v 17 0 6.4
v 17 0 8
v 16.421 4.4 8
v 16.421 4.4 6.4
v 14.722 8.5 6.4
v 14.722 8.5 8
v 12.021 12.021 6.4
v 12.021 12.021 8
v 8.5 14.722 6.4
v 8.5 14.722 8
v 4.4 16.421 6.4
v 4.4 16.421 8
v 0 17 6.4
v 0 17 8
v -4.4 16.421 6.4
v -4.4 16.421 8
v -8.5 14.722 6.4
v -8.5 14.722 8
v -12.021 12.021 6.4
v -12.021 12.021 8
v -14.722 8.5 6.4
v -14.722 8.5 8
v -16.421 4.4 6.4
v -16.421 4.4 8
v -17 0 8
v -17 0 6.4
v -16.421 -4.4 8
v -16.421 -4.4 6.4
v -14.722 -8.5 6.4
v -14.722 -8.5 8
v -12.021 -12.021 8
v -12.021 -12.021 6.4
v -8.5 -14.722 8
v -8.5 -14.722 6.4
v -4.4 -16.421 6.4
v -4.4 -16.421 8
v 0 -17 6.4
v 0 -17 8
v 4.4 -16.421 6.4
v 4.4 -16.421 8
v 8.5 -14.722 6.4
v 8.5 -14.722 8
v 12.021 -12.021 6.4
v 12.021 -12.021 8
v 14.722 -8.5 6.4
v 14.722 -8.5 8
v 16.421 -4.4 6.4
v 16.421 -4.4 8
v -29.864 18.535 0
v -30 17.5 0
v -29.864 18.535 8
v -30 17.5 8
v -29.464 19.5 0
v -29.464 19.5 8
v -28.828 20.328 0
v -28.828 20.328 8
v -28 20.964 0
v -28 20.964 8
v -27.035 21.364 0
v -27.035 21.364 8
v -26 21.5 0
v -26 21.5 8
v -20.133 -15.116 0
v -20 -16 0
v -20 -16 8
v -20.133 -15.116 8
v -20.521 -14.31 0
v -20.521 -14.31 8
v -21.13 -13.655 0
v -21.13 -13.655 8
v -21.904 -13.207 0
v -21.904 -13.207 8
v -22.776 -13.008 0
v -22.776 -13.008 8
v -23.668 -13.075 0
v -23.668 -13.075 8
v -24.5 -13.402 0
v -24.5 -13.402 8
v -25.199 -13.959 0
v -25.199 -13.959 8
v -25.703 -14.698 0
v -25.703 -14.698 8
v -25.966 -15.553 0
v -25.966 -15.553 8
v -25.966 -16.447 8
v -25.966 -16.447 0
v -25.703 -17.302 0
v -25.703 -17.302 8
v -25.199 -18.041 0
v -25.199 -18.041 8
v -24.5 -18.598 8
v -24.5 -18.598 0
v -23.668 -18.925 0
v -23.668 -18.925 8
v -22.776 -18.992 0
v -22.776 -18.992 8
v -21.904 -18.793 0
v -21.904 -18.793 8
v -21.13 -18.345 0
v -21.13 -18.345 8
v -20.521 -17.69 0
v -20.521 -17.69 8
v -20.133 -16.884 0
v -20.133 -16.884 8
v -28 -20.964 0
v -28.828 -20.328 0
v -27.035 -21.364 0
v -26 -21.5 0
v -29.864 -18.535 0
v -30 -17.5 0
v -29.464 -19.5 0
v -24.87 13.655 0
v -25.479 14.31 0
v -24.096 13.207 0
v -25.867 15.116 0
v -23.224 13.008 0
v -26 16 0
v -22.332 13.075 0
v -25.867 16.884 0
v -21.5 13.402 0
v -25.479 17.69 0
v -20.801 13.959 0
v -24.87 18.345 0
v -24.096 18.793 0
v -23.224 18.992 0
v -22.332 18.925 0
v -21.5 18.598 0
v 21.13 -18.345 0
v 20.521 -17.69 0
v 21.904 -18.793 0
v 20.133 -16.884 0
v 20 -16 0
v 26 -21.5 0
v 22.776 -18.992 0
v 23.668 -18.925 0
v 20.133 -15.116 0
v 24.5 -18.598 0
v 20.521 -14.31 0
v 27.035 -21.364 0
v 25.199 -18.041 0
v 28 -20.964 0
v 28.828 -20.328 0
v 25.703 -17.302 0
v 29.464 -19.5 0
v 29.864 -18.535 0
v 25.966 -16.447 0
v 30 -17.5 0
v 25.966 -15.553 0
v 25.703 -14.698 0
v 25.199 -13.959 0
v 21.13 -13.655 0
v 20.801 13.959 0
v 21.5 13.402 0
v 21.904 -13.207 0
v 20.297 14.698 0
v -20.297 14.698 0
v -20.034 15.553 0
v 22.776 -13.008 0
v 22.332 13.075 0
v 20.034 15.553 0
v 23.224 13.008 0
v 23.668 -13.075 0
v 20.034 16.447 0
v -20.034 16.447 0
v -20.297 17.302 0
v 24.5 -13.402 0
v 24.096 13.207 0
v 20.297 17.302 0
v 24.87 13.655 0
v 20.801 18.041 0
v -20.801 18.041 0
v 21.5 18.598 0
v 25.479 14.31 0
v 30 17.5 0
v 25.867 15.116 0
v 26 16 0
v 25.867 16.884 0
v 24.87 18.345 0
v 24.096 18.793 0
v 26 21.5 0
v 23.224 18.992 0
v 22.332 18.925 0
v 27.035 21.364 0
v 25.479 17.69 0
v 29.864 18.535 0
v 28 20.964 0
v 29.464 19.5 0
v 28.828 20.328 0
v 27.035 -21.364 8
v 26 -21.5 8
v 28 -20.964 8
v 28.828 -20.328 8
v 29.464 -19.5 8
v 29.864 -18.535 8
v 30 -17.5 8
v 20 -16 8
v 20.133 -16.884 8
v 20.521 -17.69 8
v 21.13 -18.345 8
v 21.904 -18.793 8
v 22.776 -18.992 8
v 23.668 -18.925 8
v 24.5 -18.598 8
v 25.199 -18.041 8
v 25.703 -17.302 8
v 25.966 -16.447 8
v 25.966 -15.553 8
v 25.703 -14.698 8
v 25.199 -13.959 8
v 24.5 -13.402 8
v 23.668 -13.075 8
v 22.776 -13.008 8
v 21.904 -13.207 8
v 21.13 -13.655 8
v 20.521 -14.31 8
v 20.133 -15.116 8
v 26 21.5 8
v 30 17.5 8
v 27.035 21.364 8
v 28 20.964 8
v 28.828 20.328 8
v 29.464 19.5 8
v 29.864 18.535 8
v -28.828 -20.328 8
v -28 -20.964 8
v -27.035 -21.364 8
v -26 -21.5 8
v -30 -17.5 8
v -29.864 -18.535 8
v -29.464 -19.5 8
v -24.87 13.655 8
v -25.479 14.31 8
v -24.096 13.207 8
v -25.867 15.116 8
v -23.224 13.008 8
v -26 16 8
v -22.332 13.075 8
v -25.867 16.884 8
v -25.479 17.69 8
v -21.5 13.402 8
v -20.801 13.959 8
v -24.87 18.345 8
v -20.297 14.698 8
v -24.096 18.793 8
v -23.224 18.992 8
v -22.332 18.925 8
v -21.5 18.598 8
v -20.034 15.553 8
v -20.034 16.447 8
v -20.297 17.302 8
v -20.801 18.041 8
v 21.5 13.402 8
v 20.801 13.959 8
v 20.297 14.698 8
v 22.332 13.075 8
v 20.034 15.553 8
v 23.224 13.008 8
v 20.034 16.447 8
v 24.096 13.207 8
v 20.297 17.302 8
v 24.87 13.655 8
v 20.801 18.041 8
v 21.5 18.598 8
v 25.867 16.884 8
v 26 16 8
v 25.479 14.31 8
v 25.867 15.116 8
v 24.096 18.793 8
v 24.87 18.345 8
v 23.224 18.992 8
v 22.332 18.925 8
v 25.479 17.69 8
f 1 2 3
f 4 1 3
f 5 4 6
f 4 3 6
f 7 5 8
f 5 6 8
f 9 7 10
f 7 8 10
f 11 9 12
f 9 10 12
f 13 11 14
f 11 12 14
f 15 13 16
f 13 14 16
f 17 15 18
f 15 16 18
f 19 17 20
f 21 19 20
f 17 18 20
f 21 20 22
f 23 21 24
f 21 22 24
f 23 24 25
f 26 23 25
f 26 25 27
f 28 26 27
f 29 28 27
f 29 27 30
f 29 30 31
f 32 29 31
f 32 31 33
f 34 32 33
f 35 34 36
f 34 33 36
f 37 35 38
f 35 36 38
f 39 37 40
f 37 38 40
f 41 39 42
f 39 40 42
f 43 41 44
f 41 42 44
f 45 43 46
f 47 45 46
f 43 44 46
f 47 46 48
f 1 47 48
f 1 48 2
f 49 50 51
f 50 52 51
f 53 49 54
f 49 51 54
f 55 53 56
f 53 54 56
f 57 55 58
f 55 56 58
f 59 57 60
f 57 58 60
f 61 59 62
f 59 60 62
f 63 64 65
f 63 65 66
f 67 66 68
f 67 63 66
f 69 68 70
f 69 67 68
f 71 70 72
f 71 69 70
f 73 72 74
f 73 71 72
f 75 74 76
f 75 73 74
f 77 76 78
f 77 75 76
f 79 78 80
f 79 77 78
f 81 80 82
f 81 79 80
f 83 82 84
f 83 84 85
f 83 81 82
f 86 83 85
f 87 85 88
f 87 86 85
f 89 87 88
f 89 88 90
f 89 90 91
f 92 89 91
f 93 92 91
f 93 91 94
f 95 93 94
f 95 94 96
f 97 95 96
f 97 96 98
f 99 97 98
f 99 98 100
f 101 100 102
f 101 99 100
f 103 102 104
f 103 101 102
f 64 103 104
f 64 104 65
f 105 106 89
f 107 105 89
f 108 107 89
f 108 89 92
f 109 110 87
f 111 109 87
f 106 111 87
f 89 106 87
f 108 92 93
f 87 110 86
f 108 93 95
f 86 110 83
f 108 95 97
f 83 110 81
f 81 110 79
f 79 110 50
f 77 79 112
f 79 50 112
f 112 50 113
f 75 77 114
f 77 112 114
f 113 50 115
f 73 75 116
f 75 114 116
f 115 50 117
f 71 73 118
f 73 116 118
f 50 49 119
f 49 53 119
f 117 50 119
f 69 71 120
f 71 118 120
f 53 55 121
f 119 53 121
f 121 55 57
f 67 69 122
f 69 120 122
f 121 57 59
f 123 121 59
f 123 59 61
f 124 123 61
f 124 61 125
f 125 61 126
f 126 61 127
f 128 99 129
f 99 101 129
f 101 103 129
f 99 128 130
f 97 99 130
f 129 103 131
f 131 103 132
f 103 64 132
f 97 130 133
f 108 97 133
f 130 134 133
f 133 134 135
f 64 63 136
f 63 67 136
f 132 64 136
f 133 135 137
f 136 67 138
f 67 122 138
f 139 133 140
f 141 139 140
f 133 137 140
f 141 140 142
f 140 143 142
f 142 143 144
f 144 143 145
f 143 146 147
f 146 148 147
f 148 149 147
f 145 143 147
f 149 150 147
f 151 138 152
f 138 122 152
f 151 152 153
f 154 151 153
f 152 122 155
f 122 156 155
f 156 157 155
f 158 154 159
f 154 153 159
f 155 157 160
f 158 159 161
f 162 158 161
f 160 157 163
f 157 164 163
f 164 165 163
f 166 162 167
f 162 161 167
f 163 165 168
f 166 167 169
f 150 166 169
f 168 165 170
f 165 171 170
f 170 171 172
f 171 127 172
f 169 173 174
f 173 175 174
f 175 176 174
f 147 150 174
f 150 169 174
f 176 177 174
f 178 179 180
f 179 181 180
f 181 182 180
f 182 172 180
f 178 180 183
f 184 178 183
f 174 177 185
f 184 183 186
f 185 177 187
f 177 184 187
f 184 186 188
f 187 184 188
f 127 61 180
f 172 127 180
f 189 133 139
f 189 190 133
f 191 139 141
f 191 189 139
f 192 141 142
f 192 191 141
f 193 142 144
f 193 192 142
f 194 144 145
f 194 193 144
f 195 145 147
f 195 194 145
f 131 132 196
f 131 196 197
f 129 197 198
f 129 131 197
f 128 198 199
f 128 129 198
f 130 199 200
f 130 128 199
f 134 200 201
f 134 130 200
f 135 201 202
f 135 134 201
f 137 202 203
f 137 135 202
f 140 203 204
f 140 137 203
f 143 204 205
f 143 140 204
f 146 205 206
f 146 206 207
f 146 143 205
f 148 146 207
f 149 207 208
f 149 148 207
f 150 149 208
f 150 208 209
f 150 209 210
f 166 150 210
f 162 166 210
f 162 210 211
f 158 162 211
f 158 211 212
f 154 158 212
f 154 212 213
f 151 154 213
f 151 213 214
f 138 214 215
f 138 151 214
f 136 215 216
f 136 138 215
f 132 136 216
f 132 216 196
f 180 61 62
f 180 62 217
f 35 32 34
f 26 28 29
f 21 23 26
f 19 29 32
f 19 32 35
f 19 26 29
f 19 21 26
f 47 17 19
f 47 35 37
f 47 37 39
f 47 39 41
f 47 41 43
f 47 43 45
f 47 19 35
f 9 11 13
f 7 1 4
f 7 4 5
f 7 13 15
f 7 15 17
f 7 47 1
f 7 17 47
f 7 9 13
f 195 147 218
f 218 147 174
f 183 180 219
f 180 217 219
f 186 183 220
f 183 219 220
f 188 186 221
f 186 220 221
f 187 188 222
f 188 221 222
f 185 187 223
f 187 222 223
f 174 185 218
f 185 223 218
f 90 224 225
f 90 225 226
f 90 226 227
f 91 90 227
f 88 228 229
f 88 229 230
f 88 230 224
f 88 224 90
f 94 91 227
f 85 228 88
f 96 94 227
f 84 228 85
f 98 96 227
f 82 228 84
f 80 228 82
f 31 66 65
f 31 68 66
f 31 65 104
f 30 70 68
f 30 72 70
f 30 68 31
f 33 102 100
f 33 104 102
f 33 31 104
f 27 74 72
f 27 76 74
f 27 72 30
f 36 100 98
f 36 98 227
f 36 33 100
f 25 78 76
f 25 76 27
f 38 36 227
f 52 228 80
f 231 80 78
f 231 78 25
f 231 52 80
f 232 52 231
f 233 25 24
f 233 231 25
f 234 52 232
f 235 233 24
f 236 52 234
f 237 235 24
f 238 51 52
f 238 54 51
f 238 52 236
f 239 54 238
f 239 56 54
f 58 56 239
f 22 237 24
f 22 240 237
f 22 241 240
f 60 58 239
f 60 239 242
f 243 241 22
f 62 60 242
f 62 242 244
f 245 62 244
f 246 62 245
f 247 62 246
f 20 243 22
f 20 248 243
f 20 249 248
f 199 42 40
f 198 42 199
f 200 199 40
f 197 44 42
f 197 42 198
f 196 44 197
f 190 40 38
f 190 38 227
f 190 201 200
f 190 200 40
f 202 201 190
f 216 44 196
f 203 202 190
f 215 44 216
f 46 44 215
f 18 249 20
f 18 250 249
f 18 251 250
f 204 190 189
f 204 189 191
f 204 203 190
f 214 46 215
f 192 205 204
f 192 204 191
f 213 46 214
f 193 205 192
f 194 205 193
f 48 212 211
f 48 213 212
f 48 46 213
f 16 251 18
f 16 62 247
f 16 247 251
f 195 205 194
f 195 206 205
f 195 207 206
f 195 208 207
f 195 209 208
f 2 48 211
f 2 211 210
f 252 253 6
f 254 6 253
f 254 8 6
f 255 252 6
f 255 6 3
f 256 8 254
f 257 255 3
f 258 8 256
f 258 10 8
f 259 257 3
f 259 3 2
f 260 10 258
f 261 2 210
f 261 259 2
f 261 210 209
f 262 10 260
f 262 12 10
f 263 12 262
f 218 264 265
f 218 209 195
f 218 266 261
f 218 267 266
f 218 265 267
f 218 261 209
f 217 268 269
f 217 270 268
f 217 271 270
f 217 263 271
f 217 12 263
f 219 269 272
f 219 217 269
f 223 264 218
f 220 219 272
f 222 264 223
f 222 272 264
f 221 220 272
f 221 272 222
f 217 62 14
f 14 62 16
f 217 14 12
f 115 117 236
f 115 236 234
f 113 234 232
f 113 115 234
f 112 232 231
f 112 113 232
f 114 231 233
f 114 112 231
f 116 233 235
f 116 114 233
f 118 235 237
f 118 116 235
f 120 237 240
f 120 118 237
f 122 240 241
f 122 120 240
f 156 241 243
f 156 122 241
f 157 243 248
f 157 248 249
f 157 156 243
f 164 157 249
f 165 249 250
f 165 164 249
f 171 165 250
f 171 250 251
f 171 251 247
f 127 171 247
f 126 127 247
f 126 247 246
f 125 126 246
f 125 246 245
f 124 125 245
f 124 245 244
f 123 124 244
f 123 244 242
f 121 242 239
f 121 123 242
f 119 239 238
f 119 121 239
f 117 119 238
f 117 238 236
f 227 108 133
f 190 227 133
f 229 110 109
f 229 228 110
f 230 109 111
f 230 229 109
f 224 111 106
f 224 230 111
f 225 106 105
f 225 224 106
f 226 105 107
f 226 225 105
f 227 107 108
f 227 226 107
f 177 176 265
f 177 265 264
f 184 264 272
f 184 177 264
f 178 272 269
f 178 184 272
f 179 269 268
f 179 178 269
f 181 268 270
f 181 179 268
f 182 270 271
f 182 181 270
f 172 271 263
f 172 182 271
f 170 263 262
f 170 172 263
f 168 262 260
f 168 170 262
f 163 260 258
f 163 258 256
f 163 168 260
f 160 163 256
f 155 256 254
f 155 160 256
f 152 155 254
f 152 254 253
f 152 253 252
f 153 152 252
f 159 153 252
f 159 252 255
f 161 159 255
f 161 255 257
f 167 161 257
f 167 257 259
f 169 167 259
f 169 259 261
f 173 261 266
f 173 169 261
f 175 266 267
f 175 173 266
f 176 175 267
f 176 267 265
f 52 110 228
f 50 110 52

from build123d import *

# Parameters (mm, degrees)
SKETCH1_W           = 60
SKETCH1_H           = 43
SKETCH1_R           = 3
BOSS_EXTRUDE1_DEPTH = 8
FILLET1_R           = 4
SKETCH2_R           = 17
CUT_EXTRUDE1_DEPTH  = 1.6


with BuildPart() as part:
    # Sketch1 → Boss-Extrude1 (new body)
    with BuildSketch(Plane.XY):
        Rectangle(SKETCH1_W, SKETCH1_H)
        with Locations((23, 16)):
            Circle(SKETCH1_R, mode=Mode.SUBTRACT)
        with Locations(Location((23, -16, 0), (0, 0, 180))):
            Circle(SKETCH1_R, mode=Mode.SUBTRACT)
        with Locations((-23, -16)):
            Circle(SKETCH1_R, mode=Mode.SUBTRACT)
        with Locations(Location((-23, 16, 0), (0, 0, 180))):
            Circle(SKETCH1_R, mode=Mode.SUBTRACT)
    extrude(amount=BOSS_EXTRUDE1_DEPTH)

    # Fillet1
    fillet1_edges = [part.edges().sort_by_distance(p)[0] for p in [
        (30, -21.5, 4),
        (-30, -21.5, 4),
        (-30, 21.5, 4),
        (30, 21.5, 4),
    ]]
    fillet(fillet1_edges, radius=FILLET1_R)

    # Sketch2 → Cut-Extrude1 (cut)
    with BuildSketch(Plane.XY.offset(8)):
        Circle(SKETCH2_R)
    extrude(amount=-CUT_EXTRUDE1_DEPTH, mode=Mode.SUBTRACT)


solid = part.part
